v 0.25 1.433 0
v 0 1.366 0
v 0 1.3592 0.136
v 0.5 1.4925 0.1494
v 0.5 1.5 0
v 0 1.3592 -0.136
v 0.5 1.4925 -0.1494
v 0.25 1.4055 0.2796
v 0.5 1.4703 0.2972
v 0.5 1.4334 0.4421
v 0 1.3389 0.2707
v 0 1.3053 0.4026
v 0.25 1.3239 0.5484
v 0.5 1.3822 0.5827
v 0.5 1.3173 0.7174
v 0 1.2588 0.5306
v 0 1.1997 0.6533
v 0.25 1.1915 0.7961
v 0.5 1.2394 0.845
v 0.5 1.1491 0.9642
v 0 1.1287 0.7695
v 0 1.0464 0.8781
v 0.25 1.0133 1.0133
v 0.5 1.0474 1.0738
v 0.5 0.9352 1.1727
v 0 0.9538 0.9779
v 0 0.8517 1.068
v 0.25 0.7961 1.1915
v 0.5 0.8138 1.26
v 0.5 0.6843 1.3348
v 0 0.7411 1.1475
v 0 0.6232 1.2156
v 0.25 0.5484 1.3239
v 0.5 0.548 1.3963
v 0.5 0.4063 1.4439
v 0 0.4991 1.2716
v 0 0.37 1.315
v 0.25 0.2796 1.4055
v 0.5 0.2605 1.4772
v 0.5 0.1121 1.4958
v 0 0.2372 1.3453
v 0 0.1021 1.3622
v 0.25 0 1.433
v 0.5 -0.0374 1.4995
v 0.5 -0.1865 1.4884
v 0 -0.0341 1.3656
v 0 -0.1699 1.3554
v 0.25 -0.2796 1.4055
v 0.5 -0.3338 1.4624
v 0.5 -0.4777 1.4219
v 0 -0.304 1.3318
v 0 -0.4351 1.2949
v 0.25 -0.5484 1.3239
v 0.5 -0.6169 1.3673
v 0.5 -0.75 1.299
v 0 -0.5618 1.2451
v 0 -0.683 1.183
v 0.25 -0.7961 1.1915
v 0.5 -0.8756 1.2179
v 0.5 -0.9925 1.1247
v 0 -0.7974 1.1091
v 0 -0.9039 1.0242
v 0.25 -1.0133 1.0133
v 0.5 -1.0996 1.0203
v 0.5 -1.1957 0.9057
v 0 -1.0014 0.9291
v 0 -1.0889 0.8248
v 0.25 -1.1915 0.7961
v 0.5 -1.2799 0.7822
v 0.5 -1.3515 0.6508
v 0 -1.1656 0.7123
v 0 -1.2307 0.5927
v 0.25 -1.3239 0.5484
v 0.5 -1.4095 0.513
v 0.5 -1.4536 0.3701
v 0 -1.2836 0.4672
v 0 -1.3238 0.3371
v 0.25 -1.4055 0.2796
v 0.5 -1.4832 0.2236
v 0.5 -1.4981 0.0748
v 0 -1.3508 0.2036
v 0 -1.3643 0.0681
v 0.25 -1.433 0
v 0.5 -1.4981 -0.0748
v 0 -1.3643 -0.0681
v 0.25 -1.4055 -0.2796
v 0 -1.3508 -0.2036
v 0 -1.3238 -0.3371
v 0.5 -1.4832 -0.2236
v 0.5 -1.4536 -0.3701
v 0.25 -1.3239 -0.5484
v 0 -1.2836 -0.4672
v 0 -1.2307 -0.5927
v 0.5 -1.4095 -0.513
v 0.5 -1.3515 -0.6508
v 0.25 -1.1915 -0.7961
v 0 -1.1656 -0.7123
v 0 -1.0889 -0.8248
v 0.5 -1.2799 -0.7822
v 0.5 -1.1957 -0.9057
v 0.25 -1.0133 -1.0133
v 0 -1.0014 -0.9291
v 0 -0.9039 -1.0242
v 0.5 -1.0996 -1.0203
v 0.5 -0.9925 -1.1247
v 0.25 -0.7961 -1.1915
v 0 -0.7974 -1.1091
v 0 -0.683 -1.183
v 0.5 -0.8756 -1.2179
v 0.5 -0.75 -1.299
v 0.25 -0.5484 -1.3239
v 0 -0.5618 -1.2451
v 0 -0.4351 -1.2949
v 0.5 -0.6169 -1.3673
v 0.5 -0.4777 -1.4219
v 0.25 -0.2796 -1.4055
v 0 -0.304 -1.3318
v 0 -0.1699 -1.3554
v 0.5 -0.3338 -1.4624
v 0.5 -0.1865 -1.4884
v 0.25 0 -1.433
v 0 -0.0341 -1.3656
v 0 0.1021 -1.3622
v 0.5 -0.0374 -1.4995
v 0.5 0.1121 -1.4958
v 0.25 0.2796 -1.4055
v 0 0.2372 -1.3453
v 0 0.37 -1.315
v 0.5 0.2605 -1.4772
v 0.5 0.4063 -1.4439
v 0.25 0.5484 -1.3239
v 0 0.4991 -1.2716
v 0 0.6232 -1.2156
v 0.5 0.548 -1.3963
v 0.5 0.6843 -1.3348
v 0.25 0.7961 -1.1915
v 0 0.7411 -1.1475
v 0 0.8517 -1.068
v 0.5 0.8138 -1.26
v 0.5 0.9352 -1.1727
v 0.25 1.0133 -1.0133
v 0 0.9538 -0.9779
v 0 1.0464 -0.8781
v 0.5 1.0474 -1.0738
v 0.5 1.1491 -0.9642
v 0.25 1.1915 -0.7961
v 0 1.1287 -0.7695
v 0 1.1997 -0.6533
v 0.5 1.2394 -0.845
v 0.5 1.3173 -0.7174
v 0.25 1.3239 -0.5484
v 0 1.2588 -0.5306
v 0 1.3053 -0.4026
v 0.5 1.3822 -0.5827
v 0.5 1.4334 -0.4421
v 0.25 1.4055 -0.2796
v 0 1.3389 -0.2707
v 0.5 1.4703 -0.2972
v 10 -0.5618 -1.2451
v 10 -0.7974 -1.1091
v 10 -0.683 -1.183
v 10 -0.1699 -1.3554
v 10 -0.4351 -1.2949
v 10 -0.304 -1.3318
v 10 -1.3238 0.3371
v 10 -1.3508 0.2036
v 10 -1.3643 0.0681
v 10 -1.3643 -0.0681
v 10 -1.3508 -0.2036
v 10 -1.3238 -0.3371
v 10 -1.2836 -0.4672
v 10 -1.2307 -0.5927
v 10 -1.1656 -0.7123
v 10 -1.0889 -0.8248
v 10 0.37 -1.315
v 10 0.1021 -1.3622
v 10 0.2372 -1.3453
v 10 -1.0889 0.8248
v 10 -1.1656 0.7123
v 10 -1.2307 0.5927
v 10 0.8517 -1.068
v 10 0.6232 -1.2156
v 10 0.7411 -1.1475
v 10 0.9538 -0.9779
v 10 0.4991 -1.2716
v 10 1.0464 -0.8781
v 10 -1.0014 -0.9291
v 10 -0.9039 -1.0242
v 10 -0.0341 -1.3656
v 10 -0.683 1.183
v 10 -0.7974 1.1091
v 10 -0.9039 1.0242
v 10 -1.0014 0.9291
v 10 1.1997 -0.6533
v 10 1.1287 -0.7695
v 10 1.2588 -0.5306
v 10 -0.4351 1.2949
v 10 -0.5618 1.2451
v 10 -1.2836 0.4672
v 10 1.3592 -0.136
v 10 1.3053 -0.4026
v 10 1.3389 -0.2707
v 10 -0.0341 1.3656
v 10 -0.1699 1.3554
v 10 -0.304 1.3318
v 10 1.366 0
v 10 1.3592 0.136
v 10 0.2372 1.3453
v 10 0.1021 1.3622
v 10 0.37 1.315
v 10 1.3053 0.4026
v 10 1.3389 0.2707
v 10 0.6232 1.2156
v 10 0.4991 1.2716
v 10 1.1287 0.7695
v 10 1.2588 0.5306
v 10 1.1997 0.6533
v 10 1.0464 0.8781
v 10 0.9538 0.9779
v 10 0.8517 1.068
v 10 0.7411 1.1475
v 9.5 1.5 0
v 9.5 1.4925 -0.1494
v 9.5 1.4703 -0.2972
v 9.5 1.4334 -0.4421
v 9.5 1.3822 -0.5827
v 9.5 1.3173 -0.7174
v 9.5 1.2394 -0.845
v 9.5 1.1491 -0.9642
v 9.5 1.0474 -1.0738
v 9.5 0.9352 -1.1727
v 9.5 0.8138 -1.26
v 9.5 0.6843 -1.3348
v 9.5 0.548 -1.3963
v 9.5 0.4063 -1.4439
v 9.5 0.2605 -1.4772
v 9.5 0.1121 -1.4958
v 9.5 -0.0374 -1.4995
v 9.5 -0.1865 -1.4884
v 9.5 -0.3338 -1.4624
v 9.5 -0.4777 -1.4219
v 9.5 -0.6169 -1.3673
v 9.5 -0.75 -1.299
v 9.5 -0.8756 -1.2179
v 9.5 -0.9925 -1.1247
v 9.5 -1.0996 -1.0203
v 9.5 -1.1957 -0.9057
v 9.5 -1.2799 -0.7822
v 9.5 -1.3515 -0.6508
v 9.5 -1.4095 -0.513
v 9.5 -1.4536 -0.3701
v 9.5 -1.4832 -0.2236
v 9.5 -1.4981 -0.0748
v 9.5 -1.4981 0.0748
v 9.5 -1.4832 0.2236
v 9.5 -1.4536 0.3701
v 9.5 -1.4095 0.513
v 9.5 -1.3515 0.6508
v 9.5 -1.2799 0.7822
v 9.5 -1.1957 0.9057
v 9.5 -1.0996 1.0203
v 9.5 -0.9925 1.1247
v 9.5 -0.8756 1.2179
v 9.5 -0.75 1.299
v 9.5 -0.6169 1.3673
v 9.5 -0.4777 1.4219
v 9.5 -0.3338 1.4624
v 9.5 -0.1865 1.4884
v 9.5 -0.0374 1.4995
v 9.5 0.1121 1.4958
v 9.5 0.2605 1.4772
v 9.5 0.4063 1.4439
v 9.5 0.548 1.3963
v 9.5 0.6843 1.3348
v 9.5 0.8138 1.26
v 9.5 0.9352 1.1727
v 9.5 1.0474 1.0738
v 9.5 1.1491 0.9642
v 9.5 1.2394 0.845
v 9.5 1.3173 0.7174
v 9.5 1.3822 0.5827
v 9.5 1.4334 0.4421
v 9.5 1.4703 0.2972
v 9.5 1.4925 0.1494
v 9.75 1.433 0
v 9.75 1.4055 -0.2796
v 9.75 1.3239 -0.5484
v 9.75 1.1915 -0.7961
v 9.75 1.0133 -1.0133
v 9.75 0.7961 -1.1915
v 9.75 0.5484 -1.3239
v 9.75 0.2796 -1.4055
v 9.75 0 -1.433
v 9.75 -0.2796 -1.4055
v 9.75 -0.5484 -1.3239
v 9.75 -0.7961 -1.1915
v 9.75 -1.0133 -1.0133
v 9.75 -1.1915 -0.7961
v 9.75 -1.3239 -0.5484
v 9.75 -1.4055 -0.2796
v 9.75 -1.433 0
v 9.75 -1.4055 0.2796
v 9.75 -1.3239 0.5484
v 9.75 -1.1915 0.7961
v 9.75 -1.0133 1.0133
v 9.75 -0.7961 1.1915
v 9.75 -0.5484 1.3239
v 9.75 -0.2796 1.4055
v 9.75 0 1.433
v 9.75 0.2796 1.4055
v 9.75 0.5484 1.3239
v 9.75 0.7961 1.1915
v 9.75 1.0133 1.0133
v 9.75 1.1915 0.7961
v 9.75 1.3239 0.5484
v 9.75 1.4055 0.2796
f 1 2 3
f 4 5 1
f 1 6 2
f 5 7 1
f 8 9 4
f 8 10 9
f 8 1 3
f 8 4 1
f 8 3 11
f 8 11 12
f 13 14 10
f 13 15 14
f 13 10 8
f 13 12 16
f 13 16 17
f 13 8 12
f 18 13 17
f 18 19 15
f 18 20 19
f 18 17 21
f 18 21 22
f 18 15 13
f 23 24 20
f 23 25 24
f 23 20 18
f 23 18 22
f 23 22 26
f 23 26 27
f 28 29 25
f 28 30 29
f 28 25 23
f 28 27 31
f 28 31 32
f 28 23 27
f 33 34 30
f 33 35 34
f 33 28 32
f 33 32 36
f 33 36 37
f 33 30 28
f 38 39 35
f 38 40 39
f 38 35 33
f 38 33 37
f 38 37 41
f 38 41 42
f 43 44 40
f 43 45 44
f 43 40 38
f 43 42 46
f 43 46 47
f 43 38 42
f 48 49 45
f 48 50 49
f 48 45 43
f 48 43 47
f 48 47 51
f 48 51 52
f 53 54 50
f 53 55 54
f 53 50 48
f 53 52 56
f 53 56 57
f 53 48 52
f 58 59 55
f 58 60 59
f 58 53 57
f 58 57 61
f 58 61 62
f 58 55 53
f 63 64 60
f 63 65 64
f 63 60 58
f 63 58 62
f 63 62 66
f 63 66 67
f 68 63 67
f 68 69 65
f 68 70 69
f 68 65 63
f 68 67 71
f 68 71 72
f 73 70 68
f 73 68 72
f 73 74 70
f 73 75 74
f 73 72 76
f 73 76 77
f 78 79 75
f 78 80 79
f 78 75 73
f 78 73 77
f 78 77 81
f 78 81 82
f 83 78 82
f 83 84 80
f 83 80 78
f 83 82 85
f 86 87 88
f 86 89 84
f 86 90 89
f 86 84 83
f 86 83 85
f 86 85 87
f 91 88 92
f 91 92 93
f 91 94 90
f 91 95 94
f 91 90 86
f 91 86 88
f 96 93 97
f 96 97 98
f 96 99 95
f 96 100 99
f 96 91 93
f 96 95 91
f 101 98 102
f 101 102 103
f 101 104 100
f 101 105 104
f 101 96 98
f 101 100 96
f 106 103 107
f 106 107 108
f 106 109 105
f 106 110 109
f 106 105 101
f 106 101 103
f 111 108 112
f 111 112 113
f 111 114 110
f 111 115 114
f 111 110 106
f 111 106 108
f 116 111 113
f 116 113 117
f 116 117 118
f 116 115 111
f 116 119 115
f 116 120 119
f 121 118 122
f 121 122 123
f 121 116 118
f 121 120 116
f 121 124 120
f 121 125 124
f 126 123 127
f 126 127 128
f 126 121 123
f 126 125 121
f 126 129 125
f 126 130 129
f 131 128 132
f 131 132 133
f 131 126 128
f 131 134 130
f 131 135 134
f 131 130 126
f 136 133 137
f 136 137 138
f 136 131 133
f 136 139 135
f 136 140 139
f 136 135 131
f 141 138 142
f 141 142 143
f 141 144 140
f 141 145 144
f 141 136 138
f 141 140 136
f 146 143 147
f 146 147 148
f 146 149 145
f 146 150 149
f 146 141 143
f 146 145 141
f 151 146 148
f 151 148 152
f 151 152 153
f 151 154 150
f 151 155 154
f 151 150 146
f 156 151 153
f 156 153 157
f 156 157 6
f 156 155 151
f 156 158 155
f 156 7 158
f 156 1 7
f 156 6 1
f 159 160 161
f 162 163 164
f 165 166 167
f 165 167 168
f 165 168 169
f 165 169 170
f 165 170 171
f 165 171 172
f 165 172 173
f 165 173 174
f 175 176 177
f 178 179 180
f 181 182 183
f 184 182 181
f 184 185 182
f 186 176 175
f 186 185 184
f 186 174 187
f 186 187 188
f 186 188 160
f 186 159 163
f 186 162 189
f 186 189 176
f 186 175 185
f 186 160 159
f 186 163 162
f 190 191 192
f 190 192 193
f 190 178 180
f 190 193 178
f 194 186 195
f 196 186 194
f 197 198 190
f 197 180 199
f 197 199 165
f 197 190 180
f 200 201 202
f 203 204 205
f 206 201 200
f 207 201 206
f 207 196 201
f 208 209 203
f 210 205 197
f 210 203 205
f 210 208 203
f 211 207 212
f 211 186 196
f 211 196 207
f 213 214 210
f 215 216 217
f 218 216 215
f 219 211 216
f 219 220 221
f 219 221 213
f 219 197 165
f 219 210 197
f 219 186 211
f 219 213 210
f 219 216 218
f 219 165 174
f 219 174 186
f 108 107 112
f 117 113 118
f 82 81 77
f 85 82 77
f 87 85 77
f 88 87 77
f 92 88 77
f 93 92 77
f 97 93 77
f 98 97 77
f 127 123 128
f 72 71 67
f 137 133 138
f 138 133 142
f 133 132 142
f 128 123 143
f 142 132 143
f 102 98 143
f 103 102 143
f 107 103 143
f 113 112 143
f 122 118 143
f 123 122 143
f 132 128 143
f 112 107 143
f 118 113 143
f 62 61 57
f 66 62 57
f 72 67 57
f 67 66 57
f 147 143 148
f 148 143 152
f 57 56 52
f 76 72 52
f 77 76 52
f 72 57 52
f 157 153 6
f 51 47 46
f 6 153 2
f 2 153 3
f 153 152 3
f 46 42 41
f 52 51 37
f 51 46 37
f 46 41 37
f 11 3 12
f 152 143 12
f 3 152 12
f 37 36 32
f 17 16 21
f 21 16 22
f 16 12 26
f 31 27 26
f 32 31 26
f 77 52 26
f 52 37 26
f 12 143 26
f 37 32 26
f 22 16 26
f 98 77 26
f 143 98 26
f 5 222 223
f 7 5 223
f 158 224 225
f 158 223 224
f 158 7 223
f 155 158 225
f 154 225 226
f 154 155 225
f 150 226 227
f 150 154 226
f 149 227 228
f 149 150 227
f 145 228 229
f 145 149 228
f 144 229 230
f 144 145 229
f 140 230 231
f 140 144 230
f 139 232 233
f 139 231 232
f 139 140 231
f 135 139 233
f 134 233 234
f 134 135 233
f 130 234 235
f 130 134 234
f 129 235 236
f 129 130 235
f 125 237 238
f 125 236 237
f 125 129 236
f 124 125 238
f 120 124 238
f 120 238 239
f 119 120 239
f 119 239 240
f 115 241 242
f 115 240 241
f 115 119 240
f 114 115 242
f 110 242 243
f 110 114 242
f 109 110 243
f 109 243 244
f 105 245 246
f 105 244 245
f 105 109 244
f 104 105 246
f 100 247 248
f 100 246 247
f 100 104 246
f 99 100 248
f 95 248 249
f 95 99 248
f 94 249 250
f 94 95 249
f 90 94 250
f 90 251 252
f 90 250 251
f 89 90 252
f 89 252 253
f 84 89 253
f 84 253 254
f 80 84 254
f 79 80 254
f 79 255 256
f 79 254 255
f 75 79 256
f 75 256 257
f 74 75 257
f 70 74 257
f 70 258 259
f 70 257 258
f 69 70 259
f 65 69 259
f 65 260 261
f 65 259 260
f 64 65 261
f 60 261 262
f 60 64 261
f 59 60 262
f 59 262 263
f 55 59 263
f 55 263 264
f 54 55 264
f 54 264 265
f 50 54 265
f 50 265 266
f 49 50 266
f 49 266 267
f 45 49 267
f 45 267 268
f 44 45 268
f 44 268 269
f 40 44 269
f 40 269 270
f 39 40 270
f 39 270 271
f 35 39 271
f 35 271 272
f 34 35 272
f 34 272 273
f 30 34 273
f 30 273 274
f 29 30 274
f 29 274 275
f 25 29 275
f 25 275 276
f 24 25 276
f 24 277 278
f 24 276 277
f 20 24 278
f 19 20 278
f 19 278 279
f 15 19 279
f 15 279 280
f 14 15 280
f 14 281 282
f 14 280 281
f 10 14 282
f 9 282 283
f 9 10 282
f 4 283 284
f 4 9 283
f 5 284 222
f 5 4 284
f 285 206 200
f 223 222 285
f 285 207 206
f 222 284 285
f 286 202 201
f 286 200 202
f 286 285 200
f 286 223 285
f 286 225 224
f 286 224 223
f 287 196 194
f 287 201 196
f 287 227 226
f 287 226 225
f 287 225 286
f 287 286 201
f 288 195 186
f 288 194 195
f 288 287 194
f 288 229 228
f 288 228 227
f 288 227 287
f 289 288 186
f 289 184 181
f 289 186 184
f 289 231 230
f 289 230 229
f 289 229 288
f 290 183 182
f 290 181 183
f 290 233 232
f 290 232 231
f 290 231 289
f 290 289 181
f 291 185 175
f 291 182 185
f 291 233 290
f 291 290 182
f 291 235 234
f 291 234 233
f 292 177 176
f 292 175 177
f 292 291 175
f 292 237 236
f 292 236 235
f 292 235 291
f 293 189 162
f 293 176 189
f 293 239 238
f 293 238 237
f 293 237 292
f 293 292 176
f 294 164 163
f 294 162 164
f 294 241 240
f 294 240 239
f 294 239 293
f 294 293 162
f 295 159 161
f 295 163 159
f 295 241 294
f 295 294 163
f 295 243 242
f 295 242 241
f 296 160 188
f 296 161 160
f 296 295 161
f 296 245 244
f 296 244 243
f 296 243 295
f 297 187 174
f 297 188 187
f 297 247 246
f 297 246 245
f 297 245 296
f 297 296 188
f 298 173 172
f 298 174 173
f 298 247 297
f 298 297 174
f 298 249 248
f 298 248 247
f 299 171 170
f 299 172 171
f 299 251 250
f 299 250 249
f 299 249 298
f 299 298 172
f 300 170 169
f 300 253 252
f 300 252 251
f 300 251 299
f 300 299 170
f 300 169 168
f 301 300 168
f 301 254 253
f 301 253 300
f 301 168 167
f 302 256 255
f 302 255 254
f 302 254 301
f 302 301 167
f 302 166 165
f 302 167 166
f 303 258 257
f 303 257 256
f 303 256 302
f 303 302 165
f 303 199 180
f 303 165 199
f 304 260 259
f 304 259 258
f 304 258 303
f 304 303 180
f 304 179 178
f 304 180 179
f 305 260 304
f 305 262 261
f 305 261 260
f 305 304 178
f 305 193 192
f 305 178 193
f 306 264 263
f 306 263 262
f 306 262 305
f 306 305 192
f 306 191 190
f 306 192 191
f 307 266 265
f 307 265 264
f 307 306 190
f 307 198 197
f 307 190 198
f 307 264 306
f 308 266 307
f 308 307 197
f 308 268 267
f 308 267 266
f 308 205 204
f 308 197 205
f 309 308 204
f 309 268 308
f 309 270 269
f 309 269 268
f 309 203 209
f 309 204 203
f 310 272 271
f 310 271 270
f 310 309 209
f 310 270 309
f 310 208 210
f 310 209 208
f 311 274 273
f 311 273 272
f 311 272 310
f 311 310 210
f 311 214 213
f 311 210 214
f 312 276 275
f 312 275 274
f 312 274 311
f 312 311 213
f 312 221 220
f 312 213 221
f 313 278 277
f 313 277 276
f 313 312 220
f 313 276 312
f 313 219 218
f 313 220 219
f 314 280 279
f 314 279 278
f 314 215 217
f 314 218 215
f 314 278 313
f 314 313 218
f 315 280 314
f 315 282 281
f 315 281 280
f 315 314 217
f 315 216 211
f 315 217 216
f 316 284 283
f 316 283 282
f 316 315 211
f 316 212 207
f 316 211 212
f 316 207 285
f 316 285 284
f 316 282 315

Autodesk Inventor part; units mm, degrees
ref_plane "YZ Plane" through (0, 0, 0) normal (1, 0, 0) x (0, 1, 0)
ref_plane "XZ Plane" through (0, 0, 0) normal (0, 1, 0) x (-1, 0, 0)
ref_plane "XY Plane" through (0, 0, 0) normal (0, 0, 1) x (1, 0, 0)
sketch "Skizze" plane through (0, 0, 0) normal (1, 0, 0) x (0, 1, 0)
  circle A0 centre (0, 0) radius 1.5
  dimension "d1" = 3
extrude "Körper" add sketch "Skizze" along normal blind 10
chamfer "Fase1" distance 0.5 angle 15 1 edges at (0, -1.5, 0) measured on face at (6.6667, 1.4806, -0.2406)
chamfer "Skizze2" distance 0.5 angle 15 1 edges at (10, -1.5, 0) measured on face at (6.8333, 1.4951, -0.1207)
equation "\"d1\" = NND"
equation "\"d2\" = NLG"
equation "\"d8\" = PHH"
equation "\"d9\" = FAWI"
equation "\"d12\" = PHH"
equation "\"d4\" = PHH"
equation "\"d5\" = FAWI"
equation "\"d11\" = PHH"
equation "\"NND\" = 3"
equation "\"NLG\" = 10"
equation "\"PHH\" = 0.5"
equation "\"FAWI\" = 15deg"
equation "\"KAH\" = 0"
properties part number "ISO 2338 - 3 h8 x 10" material "Edelstahl, austenitisch"
